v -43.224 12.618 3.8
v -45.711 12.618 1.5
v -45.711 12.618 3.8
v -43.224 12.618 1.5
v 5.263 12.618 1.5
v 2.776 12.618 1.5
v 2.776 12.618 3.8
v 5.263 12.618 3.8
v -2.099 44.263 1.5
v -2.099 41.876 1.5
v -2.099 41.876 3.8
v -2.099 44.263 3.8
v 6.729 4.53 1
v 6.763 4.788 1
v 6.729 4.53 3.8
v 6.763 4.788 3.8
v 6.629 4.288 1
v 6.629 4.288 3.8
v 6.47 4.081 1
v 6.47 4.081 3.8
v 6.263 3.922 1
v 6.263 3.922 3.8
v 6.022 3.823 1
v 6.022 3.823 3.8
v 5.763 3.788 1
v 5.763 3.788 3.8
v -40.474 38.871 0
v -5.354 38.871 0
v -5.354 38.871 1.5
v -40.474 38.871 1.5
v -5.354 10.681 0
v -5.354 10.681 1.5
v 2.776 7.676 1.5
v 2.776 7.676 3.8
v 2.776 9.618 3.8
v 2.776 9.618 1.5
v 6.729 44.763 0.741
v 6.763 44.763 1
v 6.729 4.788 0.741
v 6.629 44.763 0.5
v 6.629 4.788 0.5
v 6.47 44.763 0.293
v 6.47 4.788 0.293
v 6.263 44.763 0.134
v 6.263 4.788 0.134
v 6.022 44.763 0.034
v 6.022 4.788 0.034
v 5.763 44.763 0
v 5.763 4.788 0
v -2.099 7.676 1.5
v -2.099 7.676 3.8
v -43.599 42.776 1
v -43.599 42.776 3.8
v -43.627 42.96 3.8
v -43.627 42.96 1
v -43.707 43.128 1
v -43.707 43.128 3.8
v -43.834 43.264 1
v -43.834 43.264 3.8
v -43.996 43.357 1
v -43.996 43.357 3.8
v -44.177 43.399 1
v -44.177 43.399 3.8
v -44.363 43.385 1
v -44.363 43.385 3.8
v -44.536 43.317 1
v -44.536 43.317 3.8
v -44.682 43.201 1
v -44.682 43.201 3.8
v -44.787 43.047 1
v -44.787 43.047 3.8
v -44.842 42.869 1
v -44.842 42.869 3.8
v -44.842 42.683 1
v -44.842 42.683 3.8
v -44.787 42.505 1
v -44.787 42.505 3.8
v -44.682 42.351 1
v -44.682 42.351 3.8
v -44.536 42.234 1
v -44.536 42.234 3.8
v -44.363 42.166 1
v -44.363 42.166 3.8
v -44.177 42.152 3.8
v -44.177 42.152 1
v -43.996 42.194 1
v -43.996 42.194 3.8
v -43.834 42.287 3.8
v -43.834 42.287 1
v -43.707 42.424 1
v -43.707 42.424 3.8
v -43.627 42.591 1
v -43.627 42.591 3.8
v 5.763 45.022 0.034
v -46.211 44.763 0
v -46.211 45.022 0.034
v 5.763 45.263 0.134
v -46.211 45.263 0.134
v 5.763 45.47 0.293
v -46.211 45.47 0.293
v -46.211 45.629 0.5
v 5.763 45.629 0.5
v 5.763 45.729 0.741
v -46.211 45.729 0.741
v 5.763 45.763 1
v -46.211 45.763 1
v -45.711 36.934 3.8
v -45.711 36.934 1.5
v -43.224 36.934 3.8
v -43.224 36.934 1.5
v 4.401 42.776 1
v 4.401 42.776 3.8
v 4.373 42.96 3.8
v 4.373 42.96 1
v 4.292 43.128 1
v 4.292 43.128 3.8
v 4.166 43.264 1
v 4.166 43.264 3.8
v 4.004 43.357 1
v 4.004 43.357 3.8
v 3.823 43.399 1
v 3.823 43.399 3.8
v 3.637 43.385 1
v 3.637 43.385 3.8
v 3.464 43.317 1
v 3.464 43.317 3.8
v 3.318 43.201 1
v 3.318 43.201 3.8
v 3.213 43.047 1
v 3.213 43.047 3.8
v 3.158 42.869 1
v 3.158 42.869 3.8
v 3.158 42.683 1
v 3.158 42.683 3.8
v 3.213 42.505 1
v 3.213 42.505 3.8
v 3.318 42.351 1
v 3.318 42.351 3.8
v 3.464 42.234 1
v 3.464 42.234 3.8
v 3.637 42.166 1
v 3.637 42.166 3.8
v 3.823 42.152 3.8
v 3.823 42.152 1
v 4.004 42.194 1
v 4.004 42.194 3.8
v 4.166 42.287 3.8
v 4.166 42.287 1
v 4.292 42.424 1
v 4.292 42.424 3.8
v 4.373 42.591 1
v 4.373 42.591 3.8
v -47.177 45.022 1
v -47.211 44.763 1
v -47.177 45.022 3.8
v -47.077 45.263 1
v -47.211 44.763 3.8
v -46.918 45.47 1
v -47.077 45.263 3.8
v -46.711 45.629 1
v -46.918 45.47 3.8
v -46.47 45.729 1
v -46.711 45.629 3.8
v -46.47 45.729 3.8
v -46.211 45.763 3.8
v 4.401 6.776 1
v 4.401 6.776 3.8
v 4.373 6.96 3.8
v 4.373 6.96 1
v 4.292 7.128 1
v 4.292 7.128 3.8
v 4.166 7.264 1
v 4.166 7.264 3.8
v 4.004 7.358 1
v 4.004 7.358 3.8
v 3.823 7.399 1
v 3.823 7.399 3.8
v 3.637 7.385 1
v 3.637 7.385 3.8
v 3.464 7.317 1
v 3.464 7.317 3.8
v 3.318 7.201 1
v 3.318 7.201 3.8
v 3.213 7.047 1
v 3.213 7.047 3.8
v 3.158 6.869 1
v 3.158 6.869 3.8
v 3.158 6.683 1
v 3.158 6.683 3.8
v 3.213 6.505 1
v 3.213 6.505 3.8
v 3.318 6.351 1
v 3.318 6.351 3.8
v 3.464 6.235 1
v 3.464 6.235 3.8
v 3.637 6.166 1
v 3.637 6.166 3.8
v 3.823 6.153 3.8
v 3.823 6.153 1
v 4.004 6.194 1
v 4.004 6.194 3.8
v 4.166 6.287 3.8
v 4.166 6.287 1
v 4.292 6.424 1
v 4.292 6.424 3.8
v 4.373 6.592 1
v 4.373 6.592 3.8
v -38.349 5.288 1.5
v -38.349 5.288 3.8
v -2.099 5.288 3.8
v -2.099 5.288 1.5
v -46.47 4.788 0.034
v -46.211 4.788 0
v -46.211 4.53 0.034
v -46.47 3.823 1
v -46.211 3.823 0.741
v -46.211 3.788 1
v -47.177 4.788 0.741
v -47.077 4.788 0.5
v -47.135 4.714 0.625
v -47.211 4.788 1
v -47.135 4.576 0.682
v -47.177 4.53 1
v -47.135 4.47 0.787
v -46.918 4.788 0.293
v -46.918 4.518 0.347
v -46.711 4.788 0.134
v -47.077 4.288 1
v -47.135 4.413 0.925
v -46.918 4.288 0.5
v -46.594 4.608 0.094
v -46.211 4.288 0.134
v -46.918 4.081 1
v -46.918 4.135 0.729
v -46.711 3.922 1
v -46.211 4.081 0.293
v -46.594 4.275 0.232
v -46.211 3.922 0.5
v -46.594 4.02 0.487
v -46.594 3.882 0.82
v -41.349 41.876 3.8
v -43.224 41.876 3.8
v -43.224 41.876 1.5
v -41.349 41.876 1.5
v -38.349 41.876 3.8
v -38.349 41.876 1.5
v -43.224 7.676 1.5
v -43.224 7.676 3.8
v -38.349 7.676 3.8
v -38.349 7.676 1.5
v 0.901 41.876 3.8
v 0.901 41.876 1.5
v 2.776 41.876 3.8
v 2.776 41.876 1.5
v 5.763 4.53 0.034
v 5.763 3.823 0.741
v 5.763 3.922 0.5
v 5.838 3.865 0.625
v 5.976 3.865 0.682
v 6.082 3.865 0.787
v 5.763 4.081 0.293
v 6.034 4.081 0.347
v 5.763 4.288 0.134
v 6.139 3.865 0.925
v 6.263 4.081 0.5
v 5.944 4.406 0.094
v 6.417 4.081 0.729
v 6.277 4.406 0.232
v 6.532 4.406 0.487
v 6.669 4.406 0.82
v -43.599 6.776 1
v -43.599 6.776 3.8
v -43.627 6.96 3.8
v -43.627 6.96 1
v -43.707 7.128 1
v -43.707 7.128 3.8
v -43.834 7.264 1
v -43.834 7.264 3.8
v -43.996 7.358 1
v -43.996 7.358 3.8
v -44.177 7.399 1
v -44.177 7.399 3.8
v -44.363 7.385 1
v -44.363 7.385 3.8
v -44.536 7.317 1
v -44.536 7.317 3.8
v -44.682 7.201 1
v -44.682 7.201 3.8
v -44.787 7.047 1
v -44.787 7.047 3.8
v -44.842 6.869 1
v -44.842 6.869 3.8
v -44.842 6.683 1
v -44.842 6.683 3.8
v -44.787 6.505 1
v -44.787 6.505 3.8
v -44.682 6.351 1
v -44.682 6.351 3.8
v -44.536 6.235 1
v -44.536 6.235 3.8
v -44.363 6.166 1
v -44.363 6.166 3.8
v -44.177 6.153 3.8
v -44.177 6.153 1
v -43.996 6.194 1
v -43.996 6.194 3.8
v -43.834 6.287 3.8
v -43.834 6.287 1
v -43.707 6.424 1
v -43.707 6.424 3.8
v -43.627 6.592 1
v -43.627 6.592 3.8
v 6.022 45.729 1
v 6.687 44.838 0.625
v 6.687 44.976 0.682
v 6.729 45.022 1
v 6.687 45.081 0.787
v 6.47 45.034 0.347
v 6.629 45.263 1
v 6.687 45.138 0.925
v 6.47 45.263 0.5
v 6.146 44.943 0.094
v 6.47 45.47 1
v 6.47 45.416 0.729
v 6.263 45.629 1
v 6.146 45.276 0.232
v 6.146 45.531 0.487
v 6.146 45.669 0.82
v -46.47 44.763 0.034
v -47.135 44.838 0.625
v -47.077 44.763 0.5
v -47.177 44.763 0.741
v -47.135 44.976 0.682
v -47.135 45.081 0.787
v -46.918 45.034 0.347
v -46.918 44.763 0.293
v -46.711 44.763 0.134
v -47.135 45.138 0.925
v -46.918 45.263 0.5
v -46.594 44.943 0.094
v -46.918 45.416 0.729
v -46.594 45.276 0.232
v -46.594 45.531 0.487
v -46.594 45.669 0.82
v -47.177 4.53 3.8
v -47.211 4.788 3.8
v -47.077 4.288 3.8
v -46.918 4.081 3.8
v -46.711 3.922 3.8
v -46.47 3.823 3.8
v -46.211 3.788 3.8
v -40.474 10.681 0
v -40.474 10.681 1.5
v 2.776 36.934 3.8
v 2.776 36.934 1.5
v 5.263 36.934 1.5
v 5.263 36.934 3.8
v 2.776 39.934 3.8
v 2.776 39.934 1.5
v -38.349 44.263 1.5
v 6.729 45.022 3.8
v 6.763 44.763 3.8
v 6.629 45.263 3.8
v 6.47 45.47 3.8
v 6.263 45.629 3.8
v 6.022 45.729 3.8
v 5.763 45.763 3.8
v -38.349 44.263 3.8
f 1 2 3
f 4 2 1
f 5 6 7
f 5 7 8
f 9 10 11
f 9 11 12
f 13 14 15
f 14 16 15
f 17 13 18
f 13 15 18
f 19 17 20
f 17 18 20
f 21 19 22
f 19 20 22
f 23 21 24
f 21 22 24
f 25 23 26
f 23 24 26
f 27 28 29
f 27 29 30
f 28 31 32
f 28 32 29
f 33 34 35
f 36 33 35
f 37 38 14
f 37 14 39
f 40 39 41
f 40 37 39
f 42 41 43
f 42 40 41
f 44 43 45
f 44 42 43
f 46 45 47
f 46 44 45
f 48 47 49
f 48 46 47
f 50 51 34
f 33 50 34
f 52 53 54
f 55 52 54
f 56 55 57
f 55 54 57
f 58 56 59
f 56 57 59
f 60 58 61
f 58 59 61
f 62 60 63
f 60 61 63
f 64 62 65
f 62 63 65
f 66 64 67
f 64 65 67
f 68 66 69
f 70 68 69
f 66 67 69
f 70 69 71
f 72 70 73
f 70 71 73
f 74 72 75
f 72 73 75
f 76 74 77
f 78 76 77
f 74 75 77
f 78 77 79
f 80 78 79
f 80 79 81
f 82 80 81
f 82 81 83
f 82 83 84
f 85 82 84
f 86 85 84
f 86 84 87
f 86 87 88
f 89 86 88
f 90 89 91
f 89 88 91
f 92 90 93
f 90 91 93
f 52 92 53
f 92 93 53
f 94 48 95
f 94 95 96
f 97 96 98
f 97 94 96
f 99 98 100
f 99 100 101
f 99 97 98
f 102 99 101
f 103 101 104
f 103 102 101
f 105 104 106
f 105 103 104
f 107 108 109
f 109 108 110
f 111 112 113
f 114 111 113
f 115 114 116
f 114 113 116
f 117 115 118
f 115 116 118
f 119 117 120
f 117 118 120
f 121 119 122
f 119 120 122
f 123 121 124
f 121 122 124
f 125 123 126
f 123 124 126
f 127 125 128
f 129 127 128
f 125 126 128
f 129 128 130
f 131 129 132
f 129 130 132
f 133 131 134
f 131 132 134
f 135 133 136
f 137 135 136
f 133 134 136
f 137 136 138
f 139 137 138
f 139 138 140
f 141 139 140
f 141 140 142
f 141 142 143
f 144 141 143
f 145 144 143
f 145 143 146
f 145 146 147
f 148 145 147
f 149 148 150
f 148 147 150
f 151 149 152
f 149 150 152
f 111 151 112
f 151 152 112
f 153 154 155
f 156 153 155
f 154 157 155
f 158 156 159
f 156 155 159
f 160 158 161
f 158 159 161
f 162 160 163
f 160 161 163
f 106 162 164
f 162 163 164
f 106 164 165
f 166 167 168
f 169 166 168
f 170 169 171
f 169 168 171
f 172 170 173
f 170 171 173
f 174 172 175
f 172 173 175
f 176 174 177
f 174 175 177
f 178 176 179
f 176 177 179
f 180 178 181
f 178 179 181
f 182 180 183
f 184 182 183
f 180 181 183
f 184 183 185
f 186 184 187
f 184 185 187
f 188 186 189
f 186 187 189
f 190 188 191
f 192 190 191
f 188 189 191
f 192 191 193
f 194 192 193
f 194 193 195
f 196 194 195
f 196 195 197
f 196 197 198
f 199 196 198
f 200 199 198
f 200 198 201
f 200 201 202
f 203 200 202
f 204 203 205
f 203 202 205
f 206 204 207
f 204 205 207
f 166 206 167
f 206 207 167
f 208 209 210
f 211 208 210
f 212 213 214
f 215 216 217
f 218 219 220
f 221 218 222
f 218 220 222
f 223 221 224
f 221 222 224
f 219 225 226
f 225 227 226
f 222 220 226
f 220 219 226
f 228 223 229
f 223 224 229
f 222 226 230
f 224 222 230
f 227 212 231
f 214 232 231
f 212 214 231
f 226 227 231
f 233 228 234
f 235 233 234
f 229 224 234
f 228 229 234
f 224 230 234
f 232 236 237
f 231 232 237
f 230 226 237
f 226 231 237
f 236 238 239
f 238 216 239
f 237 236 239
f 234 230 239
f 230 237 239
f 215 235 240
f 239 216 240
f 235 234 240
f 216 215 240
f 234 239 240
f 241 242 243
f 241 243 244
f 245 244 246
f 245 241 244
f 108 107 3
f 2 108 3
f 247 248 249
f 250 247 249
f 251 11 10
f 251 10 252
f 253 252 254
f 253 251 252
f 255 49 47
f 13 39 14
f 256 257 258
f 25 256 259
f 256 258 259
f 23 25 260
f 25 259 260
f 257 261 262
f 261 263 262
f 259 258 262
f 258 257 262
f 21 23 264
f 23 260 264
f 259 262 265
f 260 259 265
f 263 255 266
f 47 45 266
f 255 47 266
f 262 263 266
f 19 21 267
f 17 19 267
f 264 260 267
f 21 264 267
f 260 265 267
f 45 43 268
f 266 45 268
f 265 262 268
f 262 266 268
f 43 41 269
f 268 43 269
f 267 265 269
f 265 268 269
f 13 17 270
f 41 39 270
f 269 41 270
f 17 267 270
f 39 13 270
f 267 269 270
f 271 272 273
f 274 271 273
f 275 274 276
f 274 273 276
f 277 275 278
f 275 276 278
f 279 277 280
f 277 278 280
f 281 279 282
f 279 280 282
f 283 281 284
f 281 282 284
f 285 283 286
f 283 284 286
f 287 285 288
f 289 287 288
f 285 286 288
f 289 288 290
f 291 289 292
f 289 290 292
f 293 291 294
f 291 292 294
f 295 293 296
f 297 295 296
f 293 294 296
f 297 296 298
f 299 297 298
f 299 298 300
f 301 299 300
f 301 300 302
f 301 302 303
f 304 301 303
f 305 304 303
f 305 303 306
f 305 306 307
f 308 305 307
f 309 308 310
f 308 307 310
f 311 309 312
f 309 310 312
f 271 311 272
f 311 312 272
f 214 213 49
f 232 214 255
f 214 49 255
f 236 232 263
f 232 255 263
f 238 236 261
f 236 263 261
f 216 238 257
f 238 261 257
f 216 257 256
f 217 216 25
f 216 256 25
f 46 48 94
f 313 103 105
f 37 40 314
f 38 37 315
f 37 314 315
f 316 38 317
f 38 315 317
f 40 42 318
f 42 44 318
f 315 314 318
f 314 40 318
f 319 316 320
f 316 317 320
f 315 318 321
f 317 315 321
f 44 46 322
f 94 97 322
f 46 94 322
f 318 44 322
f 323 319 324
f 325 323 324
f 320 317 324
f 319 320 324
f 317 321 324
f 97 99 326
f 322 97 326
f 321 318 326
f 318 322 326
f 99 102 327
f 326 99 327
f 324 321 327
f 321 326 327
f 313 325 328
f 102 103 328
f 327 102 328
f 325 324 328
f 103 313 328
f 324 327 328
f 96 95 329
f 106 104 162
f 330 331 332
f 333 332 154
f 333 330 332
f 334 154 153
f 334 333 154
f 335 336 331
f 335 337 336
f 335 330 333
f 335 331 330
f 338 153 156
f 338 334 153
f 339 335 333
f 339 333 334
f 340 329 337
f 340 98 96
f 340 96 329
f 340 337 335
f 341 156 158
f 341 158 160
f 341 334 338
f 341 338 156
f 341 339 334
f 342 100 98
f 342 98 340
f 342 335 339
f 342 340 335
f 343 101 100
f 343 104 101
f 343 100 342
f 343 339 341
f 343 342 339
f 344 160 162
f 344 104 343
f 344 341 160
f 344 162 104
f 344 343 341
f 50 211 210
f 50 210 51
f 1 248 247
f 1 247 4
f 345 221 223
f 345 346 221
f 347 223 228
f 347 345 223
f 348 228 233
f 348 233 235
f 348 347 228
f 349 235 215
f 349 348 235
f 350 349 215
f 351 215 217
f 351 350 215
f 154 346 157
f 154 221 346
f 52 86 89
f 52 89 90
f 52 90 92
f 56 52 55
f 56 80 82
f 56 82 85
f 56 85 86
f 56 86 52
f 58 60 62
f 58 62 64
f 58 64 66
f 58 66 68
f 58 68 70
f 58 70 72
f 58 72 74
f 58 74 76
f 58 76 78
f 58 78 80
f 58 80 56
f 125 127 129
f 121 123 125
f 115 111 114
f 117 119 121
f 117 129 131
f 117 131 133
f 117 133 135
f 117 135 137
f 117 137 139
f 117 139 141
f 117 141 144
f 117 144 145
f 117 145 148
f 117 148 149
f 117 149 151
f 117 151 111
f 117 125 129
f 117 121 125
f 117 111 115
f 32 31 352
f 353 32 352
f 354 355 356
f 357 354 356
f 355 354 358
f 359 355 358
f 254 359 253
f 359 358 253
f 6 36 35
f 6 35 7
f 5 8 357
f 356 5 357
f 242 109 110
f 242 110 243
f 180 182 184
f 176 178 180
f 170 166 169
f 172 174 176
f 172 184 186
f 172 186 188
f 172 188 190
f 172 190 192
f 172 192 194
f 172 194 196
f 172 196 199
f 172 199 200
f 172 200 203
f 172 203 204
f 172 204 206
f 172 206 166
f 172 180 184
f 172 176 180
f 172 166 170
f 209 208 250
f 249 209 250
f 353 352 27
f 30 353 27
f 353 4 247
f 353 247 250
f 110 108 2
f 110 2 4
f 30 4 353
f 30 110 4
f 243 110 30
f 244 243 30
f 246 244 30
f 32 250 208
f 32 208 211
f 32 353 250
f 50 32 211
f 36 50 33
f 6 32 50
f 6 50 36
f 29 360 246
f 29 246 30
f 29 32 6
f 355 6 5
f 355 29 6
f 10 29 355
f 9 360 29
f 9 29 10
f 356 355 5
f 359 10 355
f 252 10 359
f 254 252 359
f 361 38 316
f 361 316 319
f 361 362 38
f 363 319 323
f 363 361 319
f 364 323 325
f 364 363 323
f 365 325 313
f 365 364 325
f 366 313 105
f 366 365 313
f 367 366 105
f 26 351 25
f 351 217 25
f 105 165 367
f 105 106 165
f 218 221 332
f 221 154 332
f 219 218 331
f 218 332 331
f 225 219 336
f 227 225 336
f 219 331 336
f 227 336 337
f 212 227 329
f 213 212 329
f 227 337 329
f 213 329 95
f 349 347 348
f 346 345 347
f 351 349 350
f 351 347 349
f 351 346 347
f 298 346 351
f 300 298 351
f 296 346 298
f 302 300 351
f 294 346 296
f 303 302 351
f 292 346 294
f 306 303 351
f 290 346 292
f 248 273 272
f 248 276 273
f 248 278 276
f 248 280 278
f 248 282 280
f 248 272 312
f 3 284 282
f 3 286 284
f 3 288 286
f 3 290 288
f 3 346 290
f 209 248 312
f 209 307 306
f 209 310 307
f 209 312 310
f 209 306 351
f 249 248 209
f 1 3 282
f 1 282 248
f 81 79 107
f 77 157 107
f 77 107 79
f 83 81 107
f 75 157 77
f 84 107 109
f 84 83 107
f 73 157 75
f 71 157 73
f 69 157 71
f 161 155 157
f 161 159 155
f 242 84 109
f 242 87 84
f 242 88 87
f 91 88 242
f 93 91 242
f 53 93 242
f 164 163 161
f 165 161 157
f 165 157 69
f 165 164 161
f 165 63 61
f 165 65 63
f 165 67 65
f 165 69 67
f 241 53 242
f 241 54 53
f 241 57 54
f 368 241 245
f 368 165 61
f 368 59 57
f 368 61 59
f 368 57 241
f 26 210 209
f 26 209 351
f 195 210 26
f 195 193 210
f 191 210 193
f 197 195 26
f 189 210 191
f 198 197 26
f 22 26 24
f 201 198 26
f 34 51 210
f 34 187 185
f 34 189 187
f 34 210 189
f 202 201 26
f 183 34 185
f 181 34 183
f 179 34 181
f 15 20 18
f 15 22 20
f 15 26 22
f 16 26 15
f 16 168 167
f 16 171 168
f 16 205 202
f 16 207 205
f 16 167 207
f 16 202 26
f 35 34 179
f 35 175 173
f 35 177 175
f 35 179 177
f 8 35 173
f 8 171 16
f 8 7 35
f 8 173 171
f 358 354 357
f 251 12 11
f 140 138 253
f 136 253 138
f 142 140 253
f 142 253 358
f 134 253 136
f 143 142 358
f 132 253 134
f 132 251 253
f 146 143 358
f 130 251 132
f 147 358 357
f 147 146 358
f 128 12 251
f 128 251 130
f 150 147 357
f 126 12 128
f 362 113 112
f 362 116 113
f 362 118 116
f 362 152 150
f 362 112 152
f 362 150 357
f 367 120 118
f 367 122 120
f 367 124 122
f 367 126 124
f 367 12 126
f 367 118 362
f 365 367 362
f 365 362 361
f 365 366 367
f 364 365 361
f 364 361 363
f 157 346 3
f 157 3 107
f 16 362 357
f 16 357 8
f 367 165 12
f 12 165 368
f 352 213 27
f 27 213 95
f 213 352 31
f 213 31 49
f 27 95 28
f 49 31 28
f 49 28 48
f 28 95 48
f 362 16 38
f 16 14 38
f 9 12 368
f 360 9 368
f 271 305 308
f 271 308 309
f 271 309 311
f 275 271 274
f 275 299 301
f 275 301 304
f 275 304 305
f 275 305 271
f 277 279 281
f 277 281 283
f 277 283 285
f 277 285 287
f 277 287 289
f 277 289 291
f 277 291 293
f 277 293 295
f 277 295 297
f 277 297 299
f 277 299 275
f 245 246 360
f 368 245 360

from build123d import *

# Parameters (mm, degrees)
SKETCH_2_W          = 53.974572009
SKETCH_2_H          = 41.974503429
EXTRUDE_1_DEPTH     = 3.8
CUT_EXTRUDE_1_DEPTH = 2.3
SKETCH_4_W          = 46
SKETCH_4_H          = 34.2
CUT_EXTRUDE_2_DEPTH = 2.3
SKETCH_5_R          = 0.625
CUT_EXTRUDE_3_DEPTH = 2.8
SKETCH_7_W          = 35.12
SKETCH_7_H          = 28.19
CUT_EXTRUDE_4_DEPTH = 1.5
SKETCH_8_W          = 3
SKETCH_8_H          = 2.387251715
SKETCH_8_W_2        = 2.487286004
SKETCH_8_H_2        = 3
SKETCH_8_W_3        = 2.487286005
SKETCH_8_W_4        = 3.00002286
SKETCH_8_H_3        = 2.387274574
SKETCH_8_W_5        = 2.999984296
EXTRUDE_2_DEPTH     = 2.3
FILLET_1_R          = 1


with BuildPart() as part:
    # 草图2 → 凸台-拉伸1 (new body)
    with BuildSketch(Plane.XY):
        with Locations((-20.223936838, 24.775730738)):
            Rectangle(SKETCH_2_W, SKETCH_2_H)
    extrude(amount=EXTRUDE_1_DEPTH)

    # 草图3 → 切除-拉伸1 (cut)
    with BuildSketch(Plane.XY.offset(3.8)):
        with BuildLine():
            Line((0.763318687, 42.775657077), (0.763318687, 44.262982452))
            Line((0.763318687, 44.262982452), (-41.211192362, 44.262982452))
            Line((-41.211192362, 44.262982452), (-41.211192362, 42.775679937))
            ThreePointArc((-41.211192362, 42.775679937), (-42.093593258, 40.645375728), (-44.223897468, 39.762974832))
            Line((-44.223897468, 39.762974832), (-45.711222842, 39.762974832))
            Line((-45.711222842, 39.762974832), (-45.711222842, 9.788486643))
            Line((-45.711222842, 9.788486643), (-44.223920328, 9.788486643))
            ThreePointArc((-44.223920328, 9.788486643), (-42.093616118, 8.906085747), (-41.211215222, 6.775781538))
            Line((-41.211215222, 6.775781538), (-41.211215222, 5.288456163))
            Line((-41.211215222, 5.288456163), (0.763295827, 5.288456163))
            Line((0.763295827, 5.288456163), (0.763295827, 6.775758677))
            ThreePointArc((0.763295827, 6.775758677), (1.645696722, 8.906062887), (3.776000932, 9.788463783))
            Line((3.776000932, 9.788463783), (5.263303447, 9.788463783))
            Line((5.263303447, 9.788463783), (5.263326307, 39.762951972))
            Line((5.263326307, 39.762951972), (3.776023792, 39.762951972))
            ThreePointArc((3.776023792, 39.762951972), (1.645719582, 40.645352868), (0.763318687, 42.775657077))
        make_face()
    extrude(amount=-CUT_EXTRUDE_1_DEPTH, mode=Mode.SUBTRACT)

    # 草图4 → 切除-拉伸2 (cut)
    with BuildSketch(Plane.XY.offset(3.8)):
        with Locations((-20.223936838, 24.775730737)):
            Rectangle(SKETCH_4_W, SKETCH_4_H)
    extrude(amount=-CUT_EXTRUDE_2_DEPTH, mode=Mode.SUBTRACT)

    # 草图5 → 切除-拉伸3 (cut)
    with BuildSketch(Plane.XY.offset(3.8)):
        with Locations((-44.223897468, 42.775679937)):
            Circle(SKETCH_5_R)
        with Locations((3.776023792, 42.775679937)):
            Circle(SKETCH_5_R)
        with Locations((3.776023792, 6.775781538)):
            Circle(SKETCH_5_R)
        with Locations((-44.223897468, 6.775781538)):
            Circle(SKETCH_5_R)
    extrude(amount=-CUT_EXTRUDE_3_DEPTH, mode=Mode.SUBTRACT)

    # 草图7 → 切除-拉伸4 (cut)
    with BuildSketch(Plane(origin=(0, 0, 0), x_dir=(-1, 0, 0), z_dir=(0, 0, -1))):
        with Locations((22.913936838, 24.775730737)):
            Rectangle(SKETCH_7_W, SKETCH_7_H)
    extrude(amount=-CUT_EXTRUDE_4_DEPTH, mode=Mode.SUBTRACT)


with BuildPart() as extrude_2_tool:
    # 草图8 → 凸台-拉伸2 (new body)
    with BuildSketch(Plane.XY.offset(1.5)):
        with Locations((-39.848748169, 43.069356595)):
            Rectangle(SKETCH_8_W, SKETCH_8_H)
        with Locations((-44.46757984, 38.43376671)):
            Rectangle(SKETCH_8_W_2, SKETCH_8_H_2)
        with Locations((4.019706165, 38.43376671)):
            Rectangle(SKETCH_8_W_3, SKETCH_8_H_2)
        with Locations((-0.599125507, 43.069356595)):
            Rectangle(SKETCH_8_W, SKETCH_8_H)
        with Locations((4.019706165, 11.117694765)):
            Rectangle(SKETCH_8_W_3, SKETCH_8_H_2)
        with Locations((-44.46757984, 11.117694765)):
            Rectangle(SKETCH_8_W_2, SKETCH_8_H_2)
        with Locations((-39.848759599, 6.48209345)):
            Rectangle(SKETCH_8_W_4, SKETCH_8_H_3)
        with Locations((-0.599133359, 6.48209345)):
            Rectangle(SKETCH_8_W_5, SKETCH_8_H_3)
    extrude(amount=EXTRUDE_2_DEPTH)


with BuildPart() as part_1:
    add(part.part)


with BuildPart() as part_2:
    # 凸台-拉伸2: joined with extrude_2_tool
    add(part_1.part.fuse(extrude_2_tool.part, tol=0.00001))

    # 圆角1
    fillet_1_edges = [part_2.edges().sort_by_distance(p)[0] for p in [
        (-20.223936838, 45.762982452, 0),
        (6.763349167, 24.775730737, 0),
        (-20.223936838, 3.788479023, 0),
        (-47.211222842, 24.775730737, 0),
        (-47.211222842, 45.762982452, 1.9),
        (6.763349167, 45.762982452, 1.9),
        (6.763349167, 3.788479023, 1.9),
        (-47.211222842, 3.788479023, 1.9),
    ]]
    fillet(fillet_1_edges, radius=FILLET_1_R)


solid = part_2.part
